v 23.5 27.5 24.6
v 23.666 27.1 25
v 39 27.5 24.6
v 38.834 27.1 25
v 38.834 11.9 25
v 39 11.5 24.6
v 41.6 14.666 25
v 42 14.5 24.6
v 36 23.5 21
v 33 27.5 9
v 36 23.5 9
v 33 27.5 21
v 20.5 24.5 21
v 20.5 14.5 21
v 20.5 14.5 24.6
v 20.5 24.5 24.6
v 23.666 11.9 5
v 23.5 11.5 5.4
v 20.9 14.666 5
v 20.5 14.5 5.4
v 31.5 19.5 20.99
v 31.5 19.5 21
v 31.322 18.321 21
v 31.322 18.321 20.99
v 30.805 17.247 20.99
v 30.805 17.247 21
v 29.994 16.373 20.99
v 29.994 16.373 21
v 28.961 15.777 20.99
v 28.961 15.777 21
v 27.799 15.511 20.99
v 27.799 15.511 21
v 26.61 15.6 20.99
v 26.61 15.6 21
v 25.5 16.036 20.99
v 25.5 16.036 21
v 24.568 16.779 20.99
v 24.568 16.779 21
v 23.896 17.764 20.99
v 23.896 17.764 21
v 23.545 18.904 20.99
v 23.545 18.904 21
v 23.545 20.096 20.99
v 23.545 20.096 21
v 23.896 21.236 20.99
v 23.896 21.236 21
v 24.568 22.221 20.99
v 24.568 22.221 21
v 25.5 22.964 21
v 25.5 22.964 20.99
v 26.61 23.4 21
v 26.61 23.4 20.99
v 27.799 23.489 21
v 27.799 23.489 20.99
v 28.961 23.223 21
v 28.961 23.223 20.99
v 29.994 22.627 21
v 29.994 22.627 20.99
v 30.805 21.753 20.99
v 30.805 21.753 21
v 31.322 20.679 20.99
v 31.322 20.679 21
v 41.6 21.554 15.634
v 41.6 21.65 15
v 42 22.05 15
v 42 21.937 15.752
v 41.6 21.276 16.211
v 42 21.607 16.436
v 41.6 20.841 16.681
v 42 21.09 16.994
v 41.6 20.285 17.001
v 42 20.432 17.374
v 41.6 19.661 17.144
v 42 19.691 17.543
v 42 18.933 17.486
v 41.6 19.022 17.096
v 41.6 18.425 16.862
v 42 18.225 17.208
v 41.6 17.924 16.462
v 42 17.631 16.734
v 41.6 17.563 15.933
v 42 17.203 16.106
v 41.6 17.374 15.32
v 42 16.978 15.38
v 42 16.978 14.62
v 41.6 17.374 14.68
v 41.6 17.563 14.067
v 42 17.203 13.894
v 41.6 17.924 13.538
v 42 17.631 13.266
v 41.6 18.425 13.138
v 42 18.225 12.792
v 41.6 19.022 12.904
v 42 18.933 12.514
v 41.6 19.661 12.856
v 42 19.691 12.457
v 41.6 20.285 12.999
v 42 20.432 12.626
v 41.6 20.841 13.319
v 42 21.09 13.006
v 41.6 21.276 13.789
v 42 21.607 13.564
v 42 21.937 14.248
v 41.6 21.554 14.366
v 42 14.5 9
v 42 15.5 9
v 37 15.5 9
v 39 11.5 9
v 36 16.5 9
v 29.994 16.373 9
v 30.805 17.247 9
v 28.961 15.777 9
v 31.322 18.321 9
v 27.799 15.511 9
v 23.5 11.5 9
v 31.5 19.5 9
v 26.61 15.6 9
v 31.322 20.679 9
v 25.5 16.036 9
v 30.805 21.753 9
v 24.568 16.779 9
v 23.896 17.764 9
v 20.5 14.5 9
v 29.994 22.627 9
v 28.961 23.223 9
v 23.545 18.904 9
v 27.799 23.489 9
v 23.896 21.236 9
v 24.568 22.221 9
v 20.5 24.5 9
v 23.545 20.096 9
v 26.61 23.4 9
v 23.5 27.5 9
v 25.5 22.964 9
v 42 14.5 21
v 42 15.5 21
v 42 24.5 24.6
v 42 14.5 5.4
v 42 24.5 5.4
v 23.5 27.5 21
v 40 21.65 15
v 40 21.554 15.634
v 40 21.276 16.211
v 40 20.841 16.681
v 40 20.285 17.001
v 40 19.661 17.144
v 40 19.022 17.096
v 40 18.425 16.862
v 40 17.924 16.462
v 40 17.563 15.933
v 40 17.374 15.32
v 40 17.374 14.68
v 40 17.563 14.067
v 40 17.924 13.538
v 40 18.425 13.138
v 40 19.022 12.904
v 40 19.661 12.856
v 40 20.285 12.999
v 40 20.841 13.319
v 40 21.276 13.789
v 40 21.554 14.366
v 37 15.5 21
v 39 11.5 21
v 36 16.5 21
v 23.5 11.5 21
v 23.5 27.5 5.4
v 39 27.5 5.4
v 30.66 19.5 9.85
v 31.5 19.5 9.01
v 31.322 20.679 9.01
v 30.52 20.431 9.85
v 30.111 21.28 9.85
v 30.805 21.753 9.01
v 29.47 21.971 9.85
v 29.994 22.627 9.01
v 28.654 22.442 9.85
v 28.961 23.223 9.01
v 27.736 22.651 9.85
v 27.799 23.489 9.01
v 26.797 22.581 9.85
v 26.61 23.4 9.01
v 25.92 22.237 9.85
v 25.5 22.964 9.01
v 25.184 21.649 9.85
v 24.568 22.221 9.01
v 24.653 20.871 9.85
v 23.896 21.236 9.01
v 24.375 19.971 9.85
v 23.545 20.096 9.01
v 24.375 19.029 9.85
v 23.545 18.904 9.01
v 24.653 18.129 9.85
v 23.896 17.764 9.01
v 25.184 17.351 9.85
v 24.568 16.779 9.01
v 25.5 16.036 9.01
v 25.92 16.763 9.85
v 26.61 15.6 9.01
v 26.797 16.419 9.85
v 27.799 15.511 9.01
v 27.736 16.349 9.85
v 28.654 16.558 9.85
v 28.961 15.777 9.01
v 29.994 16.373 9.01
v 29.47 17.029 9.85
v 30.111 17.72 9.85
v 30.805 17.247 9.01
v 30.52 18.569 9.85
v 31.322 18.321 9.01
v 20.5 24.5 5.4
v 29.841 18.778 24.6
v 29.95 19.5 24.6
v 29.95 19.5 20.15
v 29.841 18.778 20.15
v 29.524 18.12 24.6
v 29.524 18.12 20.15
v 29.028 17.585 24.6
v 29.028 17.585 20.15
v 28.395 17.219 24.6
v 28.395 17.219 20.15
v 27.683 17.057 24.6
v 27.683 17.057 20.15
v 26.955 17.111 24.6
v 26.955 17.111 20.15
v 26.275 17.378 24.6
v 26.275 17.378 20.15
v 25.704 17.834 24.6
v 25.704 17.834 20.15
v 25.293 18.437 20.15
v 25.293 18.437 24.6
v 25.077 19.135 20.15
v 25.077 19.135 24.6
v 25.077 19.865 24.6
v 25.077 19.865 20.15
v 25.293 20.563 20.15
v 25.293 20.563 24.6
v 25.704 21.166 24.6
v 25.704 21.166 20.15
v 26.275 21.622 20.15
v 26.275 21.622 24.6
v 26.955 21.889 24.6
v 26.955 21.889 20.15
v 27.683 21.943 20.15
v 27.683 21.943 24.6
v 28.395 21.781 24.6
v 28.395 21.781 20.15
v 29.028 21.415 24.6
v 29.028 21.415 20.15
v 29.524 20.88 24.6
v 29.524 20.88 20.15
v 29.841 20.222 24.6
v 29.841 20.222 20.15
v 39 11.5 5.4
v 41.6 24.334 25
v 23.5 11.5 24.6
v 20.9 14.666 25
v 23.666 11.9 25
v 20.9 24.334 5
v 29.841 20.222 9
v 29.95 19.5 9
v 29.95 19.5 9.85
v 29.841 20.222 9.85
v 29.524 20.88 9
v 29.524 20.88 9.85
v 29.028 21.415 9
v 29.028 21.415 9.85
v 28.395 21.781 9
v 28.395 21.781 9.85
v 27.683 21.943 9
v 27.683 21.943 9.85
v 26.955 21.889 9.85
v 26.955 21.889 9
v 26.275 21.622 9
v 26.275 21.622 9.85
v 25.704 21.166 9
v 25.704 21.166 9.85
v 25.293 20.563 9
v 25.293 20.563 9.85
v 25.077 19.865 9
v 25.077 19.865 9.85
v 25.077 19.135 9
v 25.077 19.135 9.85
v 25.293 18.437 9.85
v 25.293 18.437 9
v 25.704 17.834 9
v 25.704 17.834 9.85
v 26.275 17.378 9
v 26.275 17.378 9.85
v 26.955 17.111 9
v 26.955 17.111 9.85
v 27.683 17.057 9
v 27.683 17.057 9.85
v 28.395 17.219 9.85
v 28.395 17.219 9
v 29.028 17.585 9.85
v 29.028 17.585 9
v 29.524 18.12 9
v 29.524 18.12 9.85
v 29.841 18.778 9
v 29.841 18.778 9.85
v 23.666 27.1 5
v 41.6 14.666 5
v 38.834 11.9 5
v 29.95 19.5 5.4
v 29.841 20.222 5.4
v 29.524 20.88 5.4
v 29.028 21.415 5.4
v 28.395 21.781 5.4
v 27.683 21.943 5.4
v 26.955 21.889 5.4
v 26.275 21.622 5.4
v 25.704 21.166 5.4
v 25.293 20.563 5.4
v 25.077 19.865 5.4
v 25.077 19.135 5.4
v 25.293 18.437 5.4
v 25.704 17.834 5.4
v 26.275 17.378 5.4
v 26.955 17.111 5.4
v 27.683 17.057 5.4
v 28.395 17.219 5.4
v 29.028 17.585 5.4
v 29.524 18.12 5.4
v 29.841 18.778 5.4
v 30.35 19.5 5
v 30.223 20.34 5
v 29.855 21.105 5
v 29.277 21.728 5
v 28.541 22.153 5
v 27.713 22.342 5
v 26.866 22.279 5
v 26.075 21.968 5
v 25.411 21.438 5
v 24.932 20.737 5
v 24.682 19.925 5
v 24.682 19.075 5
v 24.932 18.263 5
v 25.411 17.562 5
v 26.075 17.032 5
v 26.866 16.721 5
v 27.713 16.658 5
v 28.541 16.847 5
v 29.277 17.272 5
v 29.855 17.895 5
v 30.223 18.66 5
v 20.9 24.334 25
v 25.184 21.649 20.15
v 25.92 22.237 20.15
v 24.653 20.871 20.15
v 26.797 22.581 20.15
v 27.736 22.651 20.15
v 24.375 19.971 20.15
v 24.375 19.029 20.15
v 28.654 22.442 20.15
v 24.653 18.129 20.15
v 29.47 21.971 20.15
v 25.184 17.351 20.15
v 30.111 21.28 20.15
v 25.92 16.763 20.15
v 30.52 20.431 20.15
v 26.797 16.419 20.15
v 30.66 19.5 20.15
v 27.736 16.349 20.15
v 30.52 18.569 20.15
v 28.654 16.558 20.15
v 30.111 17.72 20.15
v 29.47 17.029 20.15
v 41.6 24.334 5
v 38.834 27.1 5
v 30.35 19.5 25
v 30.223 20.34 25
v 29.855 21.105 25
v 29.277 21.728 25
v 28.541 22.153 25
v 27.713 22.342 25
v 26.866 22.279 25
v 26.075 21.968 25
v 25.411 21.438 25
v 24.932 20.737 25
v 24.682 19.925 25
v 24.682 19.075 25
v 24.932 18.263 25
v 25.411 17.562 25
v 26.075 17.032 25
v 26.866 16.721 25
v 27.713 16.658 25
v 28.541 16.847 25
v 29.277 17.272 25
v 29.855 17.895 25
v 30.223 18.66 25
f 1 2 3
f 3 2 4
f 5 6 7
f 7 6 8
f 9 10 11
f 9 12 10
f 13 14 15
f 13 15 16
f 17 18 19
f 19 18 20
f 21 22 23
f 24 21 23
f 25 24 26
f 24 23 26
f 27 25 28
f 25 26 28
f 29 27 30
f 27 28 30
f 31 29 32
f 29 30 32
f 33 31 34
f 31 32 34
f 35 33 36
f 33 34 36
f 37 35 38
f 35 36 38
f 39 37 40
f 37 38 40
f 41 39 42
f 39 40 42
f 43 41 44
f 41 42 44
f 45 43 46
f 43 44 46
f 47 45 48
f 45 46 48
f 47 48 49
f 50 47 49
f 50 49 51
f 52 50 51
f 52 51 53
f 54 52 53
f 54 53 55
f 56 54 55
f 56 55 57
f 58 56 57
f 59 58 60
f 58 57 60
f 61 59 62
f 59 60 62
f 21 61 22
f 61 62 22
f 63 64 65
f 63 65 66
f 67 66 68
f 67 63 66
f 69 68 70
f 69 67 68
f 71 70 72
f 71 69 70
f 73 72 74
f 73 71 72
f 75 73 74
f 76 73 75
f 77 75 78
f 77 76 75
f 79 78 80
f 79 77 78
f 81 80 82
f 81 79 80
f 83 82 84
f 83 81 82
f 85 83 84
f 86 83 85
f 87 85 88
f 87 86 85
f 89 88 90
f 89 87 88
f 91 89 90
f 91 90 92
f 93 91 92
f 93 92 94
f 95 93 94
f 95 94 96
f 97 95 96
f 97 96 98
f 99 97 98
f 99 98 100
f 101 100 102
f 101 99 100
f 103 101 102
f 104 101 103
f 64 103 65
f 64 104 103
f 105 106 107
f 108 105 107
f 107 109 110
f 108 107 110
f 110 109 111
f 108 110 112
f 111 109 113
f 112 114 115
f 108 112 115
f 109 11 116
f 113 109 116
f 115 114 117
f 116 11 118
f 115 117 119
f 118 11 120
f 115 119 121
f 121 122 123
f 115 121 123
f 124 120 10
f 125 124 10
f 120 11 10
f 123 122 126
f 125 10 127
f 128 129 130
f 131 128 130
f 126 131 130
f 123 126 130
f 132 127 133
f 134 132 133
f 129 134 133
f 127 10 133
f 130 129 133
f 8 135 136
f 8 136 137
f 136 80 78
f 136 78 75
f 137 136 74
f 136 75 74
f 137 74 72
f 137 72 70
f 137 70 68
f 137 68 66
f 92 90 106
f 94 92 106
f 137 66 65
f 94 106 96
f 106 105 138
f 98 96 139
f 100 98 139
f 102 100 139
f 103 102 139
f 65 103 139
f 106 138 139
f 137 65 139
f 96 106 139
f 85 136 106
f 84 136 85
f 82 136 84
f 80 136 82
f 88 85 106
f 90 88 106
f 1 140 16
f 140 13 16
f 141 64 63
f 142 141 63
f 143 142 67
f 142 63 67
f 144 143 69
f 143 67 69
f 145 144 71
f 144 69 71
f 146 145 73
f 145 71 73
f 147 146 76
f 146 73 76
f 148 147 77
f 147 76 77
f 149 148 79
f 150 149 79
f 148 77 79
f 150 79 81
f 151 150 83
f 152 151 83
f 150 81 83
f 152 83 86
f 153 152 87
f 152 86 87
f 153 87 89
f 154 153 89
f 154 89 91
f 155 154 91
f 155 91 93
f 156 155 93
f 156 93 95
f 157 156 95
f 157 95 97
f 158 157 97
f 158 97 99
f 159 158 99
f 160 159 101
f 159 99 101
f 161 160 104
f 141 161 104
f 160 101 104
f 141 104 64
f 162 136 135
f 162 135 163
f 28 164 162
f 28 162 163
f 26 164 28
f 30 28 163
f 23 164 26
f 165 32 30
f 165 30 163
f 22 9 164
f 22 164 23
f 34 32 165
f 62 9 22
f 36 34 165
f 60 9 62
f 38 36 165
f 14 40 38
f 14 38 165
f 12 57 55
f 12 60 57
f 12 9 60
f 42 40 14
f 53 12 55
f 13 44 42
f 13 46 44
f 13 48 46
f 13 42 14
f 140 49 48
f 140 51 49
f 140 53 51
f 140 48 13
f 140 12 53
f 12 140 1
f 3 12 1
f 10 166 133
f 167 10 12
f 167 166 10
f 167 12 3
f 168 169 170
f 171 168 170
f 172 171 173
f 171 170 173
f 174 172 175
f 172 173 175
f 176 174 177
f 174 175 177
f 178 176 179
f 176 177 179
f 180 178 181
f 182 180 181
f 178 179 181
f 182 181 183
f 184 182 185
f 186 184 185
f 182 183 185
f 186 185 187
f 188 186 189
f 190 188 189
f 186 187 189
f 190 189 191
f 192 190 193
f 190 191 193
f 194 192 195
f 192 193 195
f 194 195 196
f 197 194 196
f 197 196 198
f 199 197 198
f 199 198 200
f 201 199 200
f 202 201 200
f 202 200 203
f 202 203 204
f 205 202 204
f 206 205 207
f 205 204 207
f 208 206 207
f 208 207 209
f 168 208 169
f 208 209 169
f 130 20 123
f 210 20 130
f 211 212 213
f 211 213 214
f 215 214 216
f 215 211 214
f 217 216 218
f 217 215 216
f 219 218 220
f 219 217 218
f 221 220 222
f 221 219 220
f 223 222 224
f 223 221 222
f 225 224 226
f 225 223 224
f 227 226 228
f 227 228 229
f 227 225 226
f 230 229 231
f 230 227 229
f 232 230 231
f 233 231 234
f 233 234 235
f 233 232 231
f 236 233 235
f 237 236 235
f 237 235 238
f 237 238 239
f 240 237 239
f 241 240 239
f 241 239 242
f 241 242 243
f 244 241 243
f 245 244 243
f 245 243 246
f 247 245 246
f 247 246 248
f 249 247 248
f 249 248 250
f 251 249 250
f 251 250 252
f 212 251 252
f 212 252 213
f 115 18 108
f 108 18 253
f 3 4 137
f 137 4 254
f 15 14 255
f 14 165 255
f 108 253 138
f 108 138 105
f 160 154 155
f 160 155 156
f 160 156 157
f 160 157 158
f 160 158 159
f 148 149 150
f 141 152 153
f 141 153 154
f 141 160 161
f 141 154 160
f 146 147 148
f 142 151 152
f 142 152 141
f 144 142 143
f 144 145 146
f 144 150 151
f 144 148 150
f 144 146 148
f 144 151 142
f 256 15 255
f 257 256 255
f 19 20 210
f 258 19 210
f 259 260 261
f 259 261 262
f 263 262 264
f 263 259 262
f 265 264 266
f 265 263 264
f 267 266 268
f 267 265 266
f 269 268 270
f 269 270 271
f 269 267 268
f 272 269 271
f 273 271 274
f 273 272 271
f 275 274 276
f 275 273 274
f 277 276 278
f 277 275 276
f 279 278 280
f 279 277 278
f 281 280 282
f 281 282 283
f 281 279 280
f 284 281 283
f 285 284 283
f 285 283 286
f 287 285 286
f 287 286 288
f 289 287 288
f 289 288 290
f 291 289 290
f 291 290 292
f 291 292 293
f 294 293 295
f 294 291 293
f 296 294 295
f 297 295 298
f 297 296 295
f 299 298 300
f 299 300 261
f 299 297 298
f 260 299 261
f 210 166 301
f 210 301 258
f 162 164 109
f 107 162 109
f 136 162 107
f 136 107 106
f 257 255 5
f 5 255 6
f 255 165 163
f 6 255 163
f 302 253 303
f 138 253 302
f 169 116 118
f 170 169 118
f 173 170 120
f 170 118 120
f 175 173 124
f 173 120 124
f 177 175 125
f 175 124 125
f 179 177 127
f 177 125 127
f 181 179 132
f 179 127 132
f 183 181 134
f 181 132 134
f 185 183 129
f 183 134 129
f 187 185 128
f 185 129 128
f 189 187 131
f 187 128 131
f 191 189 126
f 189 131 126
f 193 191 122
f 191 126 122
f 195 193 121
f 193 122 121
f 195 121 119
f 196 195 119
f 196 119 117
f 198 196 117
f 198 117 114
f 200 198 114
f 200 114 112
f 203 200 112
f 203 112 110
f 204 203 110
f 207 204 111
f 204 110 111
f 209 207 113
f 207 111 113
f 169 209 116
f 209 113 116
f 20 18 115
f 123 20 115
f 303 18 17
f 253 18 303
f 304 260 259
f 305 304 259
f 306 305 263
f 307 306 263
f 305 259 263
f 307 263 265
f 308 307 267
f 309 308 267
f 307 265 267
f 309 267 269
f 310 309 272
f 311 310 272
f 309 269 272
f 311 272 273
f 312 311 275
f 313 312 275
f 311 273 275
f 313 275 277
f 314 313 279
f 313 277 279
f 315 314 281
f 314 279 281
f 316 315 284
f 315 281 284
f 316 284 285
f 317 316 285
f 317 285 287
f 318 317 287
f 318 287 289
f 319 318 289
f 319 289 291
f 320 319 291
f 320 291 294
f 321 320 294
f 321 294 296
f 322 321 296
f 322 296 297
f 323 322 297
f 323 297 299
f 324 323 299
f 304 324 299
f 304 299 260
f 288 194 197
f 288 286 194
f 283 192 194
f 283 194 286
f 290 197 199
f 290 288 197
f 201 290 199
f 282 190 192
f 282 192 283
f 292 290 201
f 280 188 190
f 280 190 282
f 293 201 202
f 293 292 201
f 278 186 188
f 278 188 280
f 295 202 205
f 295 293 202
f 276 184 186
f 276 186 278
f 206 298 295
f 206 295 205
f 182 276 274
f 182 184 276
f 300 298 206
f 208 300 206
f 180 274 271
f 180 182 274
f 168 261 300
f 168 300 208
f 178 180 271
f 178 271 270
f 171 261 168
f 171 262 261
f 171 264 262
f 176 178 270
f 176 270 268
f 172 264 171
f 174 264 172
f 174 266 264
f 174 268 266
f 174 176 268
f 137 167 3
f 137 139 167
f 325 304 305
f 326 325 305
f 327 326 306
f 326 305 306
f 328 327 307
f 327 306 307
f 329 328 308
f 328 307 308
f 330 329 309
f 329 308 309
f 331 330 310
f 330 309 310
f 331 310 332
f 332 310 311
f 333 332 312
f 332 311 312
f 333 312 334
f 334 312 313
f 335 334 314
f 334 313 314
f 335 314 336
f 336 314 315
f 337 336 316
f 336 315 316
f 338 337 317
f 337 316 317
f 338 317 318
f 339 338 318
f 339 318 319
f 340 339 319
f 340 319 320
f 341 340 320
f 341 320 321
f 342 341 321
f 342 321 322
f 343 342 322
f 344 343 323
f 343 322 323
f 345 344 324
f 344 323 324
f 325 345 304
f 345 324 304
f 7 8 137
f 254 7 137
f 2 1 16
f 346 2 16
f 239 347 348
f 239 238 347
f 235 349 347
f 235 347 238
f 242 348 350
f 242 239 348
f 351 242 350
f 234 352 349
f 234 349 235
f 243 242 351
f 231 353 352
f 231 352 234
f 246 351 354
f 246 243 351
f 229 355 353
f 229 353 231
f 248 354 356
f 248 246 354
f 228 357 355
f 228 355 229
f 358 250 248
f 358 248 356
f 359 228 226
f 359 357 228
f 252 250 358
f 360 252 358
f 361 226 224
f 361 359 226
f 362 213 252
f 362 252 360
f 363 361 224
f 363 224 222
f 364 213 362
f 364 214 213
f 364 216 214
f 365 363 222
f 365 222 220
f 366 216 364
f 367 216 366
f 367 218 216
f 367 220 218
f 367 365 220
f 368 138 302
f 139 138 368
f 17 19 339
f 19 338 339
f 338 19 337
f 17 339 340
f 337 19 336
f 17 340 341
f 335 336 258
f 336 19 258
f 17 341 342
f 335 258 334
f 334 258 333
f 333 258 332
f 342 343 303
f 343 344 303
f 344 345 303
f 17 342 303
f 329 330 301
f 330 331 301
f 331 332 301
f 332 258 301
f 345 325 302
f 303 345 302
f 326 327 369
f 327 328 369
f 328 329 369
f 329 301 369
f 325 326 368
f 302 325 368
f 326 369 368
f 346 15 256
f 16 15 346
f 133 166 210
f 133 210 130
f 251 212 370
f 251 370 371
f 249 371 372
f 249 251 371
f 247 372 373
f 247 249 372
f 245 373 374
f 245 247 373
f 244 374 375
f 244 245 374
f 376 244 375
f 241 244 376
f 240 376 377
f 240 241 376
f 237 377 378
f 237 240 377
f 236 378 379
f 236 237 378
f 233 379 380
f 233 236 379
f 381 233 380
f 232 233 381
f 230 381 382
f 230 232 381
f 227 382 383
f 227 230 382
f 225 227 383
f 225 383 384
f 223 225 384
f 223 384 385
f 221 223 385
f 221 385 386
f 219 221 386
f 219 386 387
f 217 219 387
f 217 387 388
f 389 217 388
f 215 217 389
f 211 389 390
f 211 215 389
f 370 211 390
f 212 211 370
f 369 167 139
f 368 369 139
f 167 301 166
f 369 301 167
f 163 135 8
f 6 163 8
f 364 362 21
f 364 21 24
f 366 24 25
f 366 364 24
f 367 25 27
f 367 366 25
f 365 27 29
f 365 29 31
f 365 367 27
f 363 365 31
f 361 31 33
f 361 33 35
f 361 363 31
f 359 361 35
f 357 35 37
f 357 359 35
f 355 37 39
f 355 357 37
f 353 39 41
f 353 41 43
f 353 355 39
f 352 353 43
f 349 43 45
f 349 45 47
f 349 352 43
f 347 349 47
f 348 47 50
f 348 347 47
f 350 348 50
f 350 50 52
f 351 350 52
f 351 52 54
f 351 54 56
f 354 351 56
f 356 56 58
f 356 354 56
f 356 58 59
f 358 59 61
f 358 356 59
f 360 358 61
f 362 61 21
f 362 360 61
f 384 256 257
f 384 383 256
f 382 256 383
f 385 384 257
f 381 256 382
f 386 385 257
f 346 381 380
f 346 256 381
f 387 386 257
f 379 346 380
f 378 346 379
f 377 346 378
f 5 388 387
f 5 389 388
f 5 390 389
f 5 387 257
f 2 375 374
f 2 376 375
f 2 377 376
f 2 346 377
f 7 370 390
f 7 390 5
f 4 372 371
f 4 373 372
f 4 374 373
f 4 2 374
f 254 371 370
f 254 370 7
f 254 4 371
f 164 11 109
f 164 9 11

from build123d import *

# Parameters (mm, degrees)
SKETCH001_W     = 21.5
SKETCH001_H     = 16
PAD_DEPTH       = 20
POCKET_DEPTH    = 6
SKETCH003_R     = 2.45
POCKET001_DEPTH = 20.001
SKETCH004_R     = 4
SKETCH004_R_2   = 2.45
PAD001_DEPTH    = 0.85
SKETCH005_R     = 4
SKETCH005_R_2   = 2.45
PAD002_DEPTH    = 0.85
CHAMFER_SIZE    = 0.84
CHAMFER001_SIZE = 3
CHAMFER002_SIZE = 3
CHAMFER003_SIZE = 0.4
SKETCH010_W     = 10
SKETCH010_H     = 4
POCKET004_DEPTH = 6
SKETCH021_R     = 2.15
POCKET012_DEPTH = 2
CHAMFER010_SIZE = 0.4
CHAMFER011_SIZE = 1


with BuildPart() as part:
    # Sketch001 → Pad (new body)
    with BuildSketch(Plane.XY):
        with Locations((3.75, 0)):
            Rectangle(SKETCH001_W, SKETCH001_H)
    extrude(amount=PAD_DEPTH)

    # Sketch002 (on DatumPlane) → Pocket (cut, symmetric)
    with BuildSketch(Plane.XY.offset(10)):
        Polygon((-7, 8), (5.5, 8), (8.5, 4), (8.5, -4), (5.5, -8), (-7, -8), align=None)
    extrude(amount=POCKET_DEPTH, both=True, mode=Mode.SUBTRACT)

    # Sketch003 (on Face4 of Pocket) → Pocket001 (cut, through all)
    with BuildSketch(Plane.XY.offset(20)):
        Circle(SKETCH003_R)
    extrude(amount=-POCKET001_DEPTH, mode=Mode.SUBTRACT)

    # Sketch004 (on Face8 of Pocket001) → Pad001 (join)
    with BuildSketch(Plane.XY.offset(4)):
        Circle(SKETCH004_R)
        Circle(SKETCH004_R_2, mode=Mode.SUBTRACT)
    extrude(amount=PAD001_DEPTH)

    # Sketch005 (on Face6 of Pad001) → Pad002 (join)
    with BuildSketch(Plane(origin=(0, 0, 16), x_dir=(1, 0, 0), z_dir=(0, 0, -1))):
        Circle(SKETCH005_R)
        Circle(SKETCH005_R_2, mode=Mode.SUBTRACT)
    extrude(amount=PAD002_DEPTH)

    # Chamfer
    chamfer_edges = [part.edges().sort_by_distance(p)[0] for p in [
        (-4, 0, 4.85),
        (-4, 0, 15.15),
    ]]
    chamfer(chamfer_edges, length=CHAMFER_SIZE)

    # Chamfer001
    chamfer001_edges = [part.edges().sort_by_distance(p)[0] for p in [
        (-7, 8, 2),
        (-7, -8, 2),
        (-7, 8, 18),
        (-7, -8, 18),
    ]]
    chamfer(chamfer001_edges, length=CHAMFER001_SIZE)

    # Chamfer002
    chamfer002_edges = [part.edges().sort_by_distance(p)[0] for p in [
        (14.5, -8, 10),
        (14.5, 8, 10),
    ]]
    chamfer(chamfer002_edges, length=CHAMFER002_SIZE)

    # Chamfer003
    chamfer003_edges = [part.edges().sort_by_distance(p)[0] for p in [
        (3.75, 8, 20),
        (13, 6.5, 20),
        (-5.5, 6.5, 20),
        (14.5, 0, 20),
        (-7, 0, 20),
        (13, -6.5, 20),
        (-5.5, -6.5, 20),
        (3.75, -8, 20),
        (-2.45, 0, 20),
        (3.75, 8, 0),
        (13, 6.5, 0),
        (-5.5, 6.5, 0),
        (14.5, 0, 0),
        (-7, 0, 0),
        (13, -6.5, 0),
        (-5.5, -6.5, 0),
        (3.75, -8, 0),
        (-2.45, 0, 0),
    ]]
    chamfer(chamfer003_edges, length=CHAMFER003_SIZE)

    # Sketch010 (on DatumPlane) → Pocket004 (cut, symmetric)
    with BuildSketch(Plane.XY.offset(10)):
        with Locations((9.5, -6)):
            Rectangle(SKETCH010_W, SKETCH010_H)
    extrude(amount=POCKET004_DEPTH, both=True, mode=Mode.SUBTRACT)

    # Sketch021 (on Face10 of Pocket004) → Pocket012 (cut)
    with BuildSketch(Plane.YZ.offset(14.5)):
        with Locations((0, 10)):
            Circle(SKETCH021_R)
    extrude(amount=-POCKET012_DEPTH, mode=Mode.SUBTRACT)

    # Chamfer010
    chamfer010_edges = [part.edges().sort_by_distance(p)[0] for p in [
        (14.5, -2.15, 10),
    ]]
    chamfer(chamfer010_edges, length=CHAMFER010_SIZE)

    # Chamfer011
    chamfer011_edges = [part.edges().sort_by_distance(p)[0] for p in [
        (8.5, -4, 10),
    ]]
    chamfer(chamfer011_edges, length=CHAMFER011_SIZE)


with BuildPart() as part_1:
    # Body001 placement: moved
    add(part.part.moved(Location((27.5, 19.5, 5))))


solid = part_1.part
